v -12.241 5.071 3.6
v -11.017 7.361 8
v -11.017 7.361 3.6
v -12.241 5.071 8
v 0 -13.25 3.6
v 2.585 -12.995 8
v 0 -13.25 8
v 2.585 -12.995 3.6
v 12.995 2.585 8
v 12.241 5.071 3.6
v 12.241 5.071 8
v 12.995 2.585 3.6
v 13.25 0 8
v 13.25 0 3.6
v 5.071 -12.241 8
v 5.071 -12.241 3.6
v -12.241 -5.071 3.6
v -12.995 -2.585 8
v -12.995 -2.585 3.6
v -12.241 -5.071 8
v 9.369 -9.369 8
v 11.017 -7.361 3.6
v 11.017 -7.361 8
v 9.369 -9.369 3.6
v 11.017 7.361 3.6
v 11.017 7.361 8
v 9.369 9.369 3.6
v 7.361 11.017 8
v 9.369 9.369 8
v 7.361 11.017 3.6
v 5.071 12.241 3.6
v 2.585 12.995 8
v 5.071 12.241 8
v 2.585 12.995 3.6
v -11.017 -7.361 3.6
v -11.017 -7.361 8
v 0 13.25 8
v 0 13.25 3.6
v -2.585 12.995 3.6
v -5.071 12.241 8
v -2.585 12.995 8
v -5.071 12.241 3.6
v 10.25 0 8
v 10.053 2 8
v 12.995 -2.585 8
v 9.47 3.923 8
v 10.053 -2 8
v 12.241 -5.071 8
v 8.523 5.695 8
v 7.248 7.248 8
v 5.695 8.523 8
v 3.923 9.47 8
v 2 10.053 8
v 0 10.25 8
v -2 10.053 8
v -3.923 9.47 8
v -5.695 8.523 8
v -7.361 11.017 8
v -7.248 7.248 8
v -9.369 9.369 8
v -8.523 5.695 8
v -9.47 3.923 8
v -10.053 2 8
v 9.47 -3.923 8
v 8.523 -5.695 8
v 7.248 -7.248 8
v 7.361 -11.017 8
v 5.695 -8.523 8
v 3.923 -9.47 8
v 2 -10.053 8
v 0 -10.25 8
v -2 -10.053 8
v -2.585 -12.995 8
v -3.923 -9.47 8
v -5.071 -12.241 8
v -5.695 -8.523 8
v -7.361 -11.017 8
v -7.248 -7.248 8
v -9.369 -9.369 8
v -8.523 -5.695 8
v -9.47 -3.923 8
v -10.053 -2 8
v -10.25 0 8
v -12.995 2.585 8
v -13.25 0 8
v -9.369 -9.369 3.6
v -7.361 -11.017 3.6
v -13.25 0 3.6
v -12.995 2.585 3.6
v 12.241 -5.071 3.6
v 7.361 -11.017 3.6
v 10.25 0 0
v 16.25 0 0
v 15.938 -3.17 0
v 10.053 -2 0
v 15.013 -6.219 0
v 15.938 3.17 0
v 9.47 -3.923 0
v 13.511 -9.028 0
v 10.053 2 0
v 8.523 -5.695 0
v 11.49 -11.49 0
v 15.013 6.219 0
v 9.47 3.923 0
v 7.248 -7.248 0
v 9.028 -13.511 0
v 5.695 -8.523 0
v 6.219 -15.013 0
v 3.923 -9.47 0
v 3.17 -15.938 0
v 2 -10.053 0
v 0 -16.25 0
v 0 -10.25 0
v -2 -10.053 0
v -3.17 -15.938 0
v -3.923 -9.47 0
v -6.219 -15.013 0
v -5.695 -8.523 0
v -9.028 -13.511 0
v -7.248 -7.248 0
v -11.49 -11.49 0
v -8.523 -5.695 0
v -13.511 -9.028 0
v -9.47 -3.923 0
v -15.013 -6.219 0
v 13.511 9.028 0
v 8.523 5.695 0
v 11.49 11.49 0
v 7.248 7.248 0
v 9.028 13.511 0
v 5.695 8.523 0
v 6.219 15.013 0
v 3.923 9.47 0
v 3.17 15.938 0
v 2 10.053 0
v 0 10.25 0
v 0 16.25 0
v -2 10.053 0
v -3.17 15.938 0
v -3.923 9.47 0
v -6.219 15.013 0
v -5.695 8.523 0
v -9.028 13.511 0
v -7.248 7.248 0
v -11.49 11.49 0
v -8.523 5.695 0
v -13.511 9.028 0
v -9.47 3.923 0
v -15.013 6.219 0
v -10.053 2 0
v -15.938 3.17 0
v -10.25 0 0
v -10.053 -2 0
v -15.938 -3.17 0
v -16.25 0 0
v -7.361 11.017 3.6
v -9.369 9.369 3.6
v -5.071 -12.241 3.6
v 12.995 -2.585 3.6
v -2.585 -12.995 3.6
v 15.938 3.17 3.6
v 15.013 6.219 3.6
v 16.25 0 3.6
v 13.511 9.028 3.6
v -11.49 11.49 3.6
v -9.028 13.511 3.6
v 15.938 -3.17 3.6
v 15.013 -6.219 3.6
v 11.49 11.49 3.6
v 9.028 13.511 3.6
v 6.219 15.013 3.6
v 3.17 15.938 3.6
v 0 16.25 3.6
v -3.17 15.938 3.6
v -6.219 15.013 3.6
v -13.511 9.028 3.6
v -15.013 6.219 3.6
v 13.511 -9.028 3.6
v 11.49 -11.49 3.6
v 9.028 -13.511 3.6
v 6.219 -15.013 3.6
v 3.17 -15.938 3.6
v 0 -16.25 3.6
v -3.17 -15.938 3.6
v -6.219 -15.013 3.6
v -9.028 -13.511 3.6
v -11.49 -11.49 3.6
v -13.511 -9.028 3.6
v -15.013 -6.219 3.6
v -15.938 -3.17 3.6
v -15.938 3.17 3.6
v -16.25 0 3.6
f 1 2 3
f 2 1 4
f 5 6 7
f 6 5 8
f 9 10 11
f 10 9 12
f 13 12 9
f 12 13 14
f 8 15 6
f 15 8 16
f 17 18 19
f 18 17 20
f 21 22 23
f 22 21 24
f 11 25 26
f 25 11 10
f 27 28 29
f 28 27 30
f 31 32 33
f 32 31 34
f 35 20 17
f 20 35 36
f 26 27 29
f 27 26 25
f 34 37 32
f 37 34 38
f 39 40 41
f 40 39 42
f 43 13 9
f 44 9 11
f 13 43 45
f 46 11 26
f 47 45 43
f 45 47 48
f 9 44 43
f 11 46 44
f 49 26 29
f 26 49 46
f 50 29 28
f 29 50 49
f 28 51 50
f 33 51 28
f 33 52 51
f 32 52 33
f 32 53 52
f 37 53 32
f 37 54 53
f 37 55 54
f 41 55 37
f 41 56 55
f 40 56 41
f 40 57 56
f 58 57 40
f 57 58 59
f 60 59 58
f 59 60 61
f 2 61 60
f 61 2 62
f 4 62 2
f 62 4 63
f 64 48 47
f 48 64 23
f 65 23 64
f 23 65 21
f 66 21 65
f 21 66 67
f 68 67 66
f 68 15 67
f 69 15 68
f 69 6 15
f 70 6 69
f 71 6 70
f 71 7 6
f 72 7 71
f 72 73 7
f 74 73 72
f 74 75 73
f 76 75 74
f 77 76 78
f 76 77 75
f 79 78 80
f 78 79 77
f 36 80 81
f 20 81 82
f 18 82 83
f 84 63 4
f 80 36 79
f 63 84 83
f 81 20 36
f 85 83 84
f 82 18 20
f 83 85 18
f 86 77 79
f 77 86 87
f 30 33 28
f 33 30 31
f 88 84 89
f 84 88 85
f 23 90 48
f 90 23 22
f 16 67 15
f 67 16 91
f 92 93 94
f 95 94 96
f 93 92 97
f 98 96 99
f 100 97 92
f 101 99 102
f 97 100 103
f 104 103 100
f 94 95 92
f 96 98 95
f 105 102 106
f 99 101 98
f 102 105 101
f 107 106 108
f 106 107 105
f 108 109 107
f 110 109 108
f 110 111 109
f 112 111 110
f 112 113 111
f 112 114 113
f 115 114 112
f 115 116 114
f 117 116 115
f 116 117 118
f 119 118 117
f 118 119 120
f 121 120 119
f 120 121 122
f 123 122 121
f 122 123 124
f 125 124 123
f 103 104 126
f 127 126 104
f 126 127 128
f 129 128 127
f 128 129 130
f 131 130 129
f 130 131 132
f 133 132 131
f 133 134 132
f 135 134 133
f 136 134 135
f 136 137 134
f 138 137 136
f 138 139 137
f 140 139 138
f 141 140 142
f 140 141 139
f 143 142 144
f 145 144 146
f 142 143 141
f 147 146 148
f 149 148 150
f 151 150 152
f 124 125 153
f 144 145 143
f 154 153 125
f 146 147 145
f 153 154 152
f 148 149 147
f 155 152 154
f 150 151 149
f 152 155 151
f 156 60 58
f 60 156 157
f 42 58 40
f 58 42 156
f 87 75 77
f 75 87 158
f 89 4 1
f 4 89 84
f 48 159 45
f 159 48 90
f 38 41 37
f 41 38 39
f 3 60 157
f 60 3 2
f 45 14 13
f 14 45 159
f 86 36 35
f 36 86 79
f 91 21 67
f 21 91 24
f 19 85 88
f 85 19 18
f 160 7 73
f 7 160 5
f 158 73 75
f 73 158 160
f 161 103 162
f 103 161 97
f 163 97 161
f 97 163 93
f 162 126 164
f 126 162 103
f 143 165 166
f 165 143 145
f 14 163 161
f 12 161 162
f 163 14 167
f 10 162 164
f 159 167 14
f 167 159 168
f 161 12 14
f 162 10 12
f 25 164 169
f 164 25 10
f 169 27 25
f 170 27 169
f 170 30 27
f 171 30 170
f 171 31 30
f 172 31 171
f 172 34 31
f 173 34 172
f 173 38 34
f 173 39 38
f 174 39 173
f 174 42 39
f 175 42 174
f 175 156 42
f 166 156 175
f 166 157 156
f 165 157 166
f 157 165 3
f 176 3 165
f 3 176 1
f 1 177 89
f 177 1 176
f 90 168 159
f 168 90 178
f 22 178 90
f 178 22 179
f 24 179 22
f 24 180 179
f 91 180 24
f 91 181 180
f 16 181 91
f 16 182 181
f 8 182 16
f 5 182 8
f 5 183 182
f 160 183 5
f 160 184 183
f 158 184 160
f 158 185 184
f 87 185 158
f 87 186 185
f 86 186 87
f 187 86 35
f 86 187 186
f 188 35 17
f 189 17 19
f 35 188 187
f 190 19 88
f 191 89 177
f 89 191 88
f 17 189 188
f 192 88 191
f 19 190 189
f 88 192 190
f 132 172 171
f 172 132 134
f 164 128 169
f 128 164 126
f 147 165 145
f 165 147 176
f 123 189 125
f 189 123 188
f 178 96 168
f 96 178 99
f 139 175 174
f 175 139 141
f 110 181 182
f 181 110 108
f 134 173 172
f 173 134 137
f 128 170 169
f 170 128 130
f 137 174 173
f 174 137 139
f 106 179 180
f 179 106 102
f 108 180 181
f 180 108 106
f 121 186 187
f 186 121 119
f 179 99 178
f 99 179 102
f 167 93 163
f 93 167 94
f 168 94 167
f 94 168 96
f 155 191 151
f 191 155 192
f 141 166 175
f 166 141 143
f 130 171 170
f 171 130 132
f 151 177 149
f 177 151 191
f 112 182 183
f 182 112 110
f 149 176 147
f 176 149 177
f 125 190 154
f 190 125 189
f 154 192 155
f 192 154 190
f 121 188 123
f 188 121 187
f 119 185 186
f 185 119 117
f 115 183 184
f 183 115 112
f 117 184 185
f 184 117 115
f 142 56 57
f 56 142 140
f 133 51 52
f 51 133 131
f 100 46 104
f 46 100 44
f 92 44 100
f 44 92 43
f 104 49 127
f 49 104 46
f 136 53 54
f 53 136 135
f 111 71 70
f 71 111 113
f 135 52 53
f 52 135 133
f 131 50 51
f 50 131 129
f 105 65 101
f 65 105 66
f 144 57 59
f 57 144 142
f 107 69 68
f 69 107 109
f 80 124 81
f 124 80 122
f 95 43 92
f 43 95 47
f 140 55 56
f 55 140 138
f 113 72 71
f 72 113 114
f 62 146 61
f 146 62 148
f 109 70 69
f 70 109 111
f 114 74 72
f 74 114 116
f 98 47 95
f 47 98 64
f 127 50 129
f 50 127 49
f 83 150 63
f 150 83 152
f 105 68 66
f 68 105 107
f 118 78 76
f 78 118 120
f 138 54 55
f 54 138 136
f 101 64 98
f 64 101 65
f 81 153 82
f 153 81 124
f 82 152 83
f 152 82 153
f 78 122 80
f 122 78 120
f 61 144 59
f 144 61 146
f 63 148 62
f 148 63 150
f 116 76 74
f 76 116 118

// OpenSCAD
$fn = 32;

// ----------------------------------------------------------------------
// Spacer sleeve: 26.5 / 20.5 x 8 mm
// ----------------------------------------------------------------------

// --- parameters (mm) ---
outer_d = 26.5;           // outside diameter
inner_d = 20.5;           // shaft bore
length = 8;               // sleeve length
flange_d = 32.5;          // collar diameter
flange_t = 3;             // collar thickness

module sleeve() {
  cylinder(h = length, d = outer_d);
  cylinder(h = flange_t + 0.6, d = flange_d);
}

difference() {
  sleeve();
  translate([0, 0, -1]) cylinder(h = length + 2, d = inner_d);
}
